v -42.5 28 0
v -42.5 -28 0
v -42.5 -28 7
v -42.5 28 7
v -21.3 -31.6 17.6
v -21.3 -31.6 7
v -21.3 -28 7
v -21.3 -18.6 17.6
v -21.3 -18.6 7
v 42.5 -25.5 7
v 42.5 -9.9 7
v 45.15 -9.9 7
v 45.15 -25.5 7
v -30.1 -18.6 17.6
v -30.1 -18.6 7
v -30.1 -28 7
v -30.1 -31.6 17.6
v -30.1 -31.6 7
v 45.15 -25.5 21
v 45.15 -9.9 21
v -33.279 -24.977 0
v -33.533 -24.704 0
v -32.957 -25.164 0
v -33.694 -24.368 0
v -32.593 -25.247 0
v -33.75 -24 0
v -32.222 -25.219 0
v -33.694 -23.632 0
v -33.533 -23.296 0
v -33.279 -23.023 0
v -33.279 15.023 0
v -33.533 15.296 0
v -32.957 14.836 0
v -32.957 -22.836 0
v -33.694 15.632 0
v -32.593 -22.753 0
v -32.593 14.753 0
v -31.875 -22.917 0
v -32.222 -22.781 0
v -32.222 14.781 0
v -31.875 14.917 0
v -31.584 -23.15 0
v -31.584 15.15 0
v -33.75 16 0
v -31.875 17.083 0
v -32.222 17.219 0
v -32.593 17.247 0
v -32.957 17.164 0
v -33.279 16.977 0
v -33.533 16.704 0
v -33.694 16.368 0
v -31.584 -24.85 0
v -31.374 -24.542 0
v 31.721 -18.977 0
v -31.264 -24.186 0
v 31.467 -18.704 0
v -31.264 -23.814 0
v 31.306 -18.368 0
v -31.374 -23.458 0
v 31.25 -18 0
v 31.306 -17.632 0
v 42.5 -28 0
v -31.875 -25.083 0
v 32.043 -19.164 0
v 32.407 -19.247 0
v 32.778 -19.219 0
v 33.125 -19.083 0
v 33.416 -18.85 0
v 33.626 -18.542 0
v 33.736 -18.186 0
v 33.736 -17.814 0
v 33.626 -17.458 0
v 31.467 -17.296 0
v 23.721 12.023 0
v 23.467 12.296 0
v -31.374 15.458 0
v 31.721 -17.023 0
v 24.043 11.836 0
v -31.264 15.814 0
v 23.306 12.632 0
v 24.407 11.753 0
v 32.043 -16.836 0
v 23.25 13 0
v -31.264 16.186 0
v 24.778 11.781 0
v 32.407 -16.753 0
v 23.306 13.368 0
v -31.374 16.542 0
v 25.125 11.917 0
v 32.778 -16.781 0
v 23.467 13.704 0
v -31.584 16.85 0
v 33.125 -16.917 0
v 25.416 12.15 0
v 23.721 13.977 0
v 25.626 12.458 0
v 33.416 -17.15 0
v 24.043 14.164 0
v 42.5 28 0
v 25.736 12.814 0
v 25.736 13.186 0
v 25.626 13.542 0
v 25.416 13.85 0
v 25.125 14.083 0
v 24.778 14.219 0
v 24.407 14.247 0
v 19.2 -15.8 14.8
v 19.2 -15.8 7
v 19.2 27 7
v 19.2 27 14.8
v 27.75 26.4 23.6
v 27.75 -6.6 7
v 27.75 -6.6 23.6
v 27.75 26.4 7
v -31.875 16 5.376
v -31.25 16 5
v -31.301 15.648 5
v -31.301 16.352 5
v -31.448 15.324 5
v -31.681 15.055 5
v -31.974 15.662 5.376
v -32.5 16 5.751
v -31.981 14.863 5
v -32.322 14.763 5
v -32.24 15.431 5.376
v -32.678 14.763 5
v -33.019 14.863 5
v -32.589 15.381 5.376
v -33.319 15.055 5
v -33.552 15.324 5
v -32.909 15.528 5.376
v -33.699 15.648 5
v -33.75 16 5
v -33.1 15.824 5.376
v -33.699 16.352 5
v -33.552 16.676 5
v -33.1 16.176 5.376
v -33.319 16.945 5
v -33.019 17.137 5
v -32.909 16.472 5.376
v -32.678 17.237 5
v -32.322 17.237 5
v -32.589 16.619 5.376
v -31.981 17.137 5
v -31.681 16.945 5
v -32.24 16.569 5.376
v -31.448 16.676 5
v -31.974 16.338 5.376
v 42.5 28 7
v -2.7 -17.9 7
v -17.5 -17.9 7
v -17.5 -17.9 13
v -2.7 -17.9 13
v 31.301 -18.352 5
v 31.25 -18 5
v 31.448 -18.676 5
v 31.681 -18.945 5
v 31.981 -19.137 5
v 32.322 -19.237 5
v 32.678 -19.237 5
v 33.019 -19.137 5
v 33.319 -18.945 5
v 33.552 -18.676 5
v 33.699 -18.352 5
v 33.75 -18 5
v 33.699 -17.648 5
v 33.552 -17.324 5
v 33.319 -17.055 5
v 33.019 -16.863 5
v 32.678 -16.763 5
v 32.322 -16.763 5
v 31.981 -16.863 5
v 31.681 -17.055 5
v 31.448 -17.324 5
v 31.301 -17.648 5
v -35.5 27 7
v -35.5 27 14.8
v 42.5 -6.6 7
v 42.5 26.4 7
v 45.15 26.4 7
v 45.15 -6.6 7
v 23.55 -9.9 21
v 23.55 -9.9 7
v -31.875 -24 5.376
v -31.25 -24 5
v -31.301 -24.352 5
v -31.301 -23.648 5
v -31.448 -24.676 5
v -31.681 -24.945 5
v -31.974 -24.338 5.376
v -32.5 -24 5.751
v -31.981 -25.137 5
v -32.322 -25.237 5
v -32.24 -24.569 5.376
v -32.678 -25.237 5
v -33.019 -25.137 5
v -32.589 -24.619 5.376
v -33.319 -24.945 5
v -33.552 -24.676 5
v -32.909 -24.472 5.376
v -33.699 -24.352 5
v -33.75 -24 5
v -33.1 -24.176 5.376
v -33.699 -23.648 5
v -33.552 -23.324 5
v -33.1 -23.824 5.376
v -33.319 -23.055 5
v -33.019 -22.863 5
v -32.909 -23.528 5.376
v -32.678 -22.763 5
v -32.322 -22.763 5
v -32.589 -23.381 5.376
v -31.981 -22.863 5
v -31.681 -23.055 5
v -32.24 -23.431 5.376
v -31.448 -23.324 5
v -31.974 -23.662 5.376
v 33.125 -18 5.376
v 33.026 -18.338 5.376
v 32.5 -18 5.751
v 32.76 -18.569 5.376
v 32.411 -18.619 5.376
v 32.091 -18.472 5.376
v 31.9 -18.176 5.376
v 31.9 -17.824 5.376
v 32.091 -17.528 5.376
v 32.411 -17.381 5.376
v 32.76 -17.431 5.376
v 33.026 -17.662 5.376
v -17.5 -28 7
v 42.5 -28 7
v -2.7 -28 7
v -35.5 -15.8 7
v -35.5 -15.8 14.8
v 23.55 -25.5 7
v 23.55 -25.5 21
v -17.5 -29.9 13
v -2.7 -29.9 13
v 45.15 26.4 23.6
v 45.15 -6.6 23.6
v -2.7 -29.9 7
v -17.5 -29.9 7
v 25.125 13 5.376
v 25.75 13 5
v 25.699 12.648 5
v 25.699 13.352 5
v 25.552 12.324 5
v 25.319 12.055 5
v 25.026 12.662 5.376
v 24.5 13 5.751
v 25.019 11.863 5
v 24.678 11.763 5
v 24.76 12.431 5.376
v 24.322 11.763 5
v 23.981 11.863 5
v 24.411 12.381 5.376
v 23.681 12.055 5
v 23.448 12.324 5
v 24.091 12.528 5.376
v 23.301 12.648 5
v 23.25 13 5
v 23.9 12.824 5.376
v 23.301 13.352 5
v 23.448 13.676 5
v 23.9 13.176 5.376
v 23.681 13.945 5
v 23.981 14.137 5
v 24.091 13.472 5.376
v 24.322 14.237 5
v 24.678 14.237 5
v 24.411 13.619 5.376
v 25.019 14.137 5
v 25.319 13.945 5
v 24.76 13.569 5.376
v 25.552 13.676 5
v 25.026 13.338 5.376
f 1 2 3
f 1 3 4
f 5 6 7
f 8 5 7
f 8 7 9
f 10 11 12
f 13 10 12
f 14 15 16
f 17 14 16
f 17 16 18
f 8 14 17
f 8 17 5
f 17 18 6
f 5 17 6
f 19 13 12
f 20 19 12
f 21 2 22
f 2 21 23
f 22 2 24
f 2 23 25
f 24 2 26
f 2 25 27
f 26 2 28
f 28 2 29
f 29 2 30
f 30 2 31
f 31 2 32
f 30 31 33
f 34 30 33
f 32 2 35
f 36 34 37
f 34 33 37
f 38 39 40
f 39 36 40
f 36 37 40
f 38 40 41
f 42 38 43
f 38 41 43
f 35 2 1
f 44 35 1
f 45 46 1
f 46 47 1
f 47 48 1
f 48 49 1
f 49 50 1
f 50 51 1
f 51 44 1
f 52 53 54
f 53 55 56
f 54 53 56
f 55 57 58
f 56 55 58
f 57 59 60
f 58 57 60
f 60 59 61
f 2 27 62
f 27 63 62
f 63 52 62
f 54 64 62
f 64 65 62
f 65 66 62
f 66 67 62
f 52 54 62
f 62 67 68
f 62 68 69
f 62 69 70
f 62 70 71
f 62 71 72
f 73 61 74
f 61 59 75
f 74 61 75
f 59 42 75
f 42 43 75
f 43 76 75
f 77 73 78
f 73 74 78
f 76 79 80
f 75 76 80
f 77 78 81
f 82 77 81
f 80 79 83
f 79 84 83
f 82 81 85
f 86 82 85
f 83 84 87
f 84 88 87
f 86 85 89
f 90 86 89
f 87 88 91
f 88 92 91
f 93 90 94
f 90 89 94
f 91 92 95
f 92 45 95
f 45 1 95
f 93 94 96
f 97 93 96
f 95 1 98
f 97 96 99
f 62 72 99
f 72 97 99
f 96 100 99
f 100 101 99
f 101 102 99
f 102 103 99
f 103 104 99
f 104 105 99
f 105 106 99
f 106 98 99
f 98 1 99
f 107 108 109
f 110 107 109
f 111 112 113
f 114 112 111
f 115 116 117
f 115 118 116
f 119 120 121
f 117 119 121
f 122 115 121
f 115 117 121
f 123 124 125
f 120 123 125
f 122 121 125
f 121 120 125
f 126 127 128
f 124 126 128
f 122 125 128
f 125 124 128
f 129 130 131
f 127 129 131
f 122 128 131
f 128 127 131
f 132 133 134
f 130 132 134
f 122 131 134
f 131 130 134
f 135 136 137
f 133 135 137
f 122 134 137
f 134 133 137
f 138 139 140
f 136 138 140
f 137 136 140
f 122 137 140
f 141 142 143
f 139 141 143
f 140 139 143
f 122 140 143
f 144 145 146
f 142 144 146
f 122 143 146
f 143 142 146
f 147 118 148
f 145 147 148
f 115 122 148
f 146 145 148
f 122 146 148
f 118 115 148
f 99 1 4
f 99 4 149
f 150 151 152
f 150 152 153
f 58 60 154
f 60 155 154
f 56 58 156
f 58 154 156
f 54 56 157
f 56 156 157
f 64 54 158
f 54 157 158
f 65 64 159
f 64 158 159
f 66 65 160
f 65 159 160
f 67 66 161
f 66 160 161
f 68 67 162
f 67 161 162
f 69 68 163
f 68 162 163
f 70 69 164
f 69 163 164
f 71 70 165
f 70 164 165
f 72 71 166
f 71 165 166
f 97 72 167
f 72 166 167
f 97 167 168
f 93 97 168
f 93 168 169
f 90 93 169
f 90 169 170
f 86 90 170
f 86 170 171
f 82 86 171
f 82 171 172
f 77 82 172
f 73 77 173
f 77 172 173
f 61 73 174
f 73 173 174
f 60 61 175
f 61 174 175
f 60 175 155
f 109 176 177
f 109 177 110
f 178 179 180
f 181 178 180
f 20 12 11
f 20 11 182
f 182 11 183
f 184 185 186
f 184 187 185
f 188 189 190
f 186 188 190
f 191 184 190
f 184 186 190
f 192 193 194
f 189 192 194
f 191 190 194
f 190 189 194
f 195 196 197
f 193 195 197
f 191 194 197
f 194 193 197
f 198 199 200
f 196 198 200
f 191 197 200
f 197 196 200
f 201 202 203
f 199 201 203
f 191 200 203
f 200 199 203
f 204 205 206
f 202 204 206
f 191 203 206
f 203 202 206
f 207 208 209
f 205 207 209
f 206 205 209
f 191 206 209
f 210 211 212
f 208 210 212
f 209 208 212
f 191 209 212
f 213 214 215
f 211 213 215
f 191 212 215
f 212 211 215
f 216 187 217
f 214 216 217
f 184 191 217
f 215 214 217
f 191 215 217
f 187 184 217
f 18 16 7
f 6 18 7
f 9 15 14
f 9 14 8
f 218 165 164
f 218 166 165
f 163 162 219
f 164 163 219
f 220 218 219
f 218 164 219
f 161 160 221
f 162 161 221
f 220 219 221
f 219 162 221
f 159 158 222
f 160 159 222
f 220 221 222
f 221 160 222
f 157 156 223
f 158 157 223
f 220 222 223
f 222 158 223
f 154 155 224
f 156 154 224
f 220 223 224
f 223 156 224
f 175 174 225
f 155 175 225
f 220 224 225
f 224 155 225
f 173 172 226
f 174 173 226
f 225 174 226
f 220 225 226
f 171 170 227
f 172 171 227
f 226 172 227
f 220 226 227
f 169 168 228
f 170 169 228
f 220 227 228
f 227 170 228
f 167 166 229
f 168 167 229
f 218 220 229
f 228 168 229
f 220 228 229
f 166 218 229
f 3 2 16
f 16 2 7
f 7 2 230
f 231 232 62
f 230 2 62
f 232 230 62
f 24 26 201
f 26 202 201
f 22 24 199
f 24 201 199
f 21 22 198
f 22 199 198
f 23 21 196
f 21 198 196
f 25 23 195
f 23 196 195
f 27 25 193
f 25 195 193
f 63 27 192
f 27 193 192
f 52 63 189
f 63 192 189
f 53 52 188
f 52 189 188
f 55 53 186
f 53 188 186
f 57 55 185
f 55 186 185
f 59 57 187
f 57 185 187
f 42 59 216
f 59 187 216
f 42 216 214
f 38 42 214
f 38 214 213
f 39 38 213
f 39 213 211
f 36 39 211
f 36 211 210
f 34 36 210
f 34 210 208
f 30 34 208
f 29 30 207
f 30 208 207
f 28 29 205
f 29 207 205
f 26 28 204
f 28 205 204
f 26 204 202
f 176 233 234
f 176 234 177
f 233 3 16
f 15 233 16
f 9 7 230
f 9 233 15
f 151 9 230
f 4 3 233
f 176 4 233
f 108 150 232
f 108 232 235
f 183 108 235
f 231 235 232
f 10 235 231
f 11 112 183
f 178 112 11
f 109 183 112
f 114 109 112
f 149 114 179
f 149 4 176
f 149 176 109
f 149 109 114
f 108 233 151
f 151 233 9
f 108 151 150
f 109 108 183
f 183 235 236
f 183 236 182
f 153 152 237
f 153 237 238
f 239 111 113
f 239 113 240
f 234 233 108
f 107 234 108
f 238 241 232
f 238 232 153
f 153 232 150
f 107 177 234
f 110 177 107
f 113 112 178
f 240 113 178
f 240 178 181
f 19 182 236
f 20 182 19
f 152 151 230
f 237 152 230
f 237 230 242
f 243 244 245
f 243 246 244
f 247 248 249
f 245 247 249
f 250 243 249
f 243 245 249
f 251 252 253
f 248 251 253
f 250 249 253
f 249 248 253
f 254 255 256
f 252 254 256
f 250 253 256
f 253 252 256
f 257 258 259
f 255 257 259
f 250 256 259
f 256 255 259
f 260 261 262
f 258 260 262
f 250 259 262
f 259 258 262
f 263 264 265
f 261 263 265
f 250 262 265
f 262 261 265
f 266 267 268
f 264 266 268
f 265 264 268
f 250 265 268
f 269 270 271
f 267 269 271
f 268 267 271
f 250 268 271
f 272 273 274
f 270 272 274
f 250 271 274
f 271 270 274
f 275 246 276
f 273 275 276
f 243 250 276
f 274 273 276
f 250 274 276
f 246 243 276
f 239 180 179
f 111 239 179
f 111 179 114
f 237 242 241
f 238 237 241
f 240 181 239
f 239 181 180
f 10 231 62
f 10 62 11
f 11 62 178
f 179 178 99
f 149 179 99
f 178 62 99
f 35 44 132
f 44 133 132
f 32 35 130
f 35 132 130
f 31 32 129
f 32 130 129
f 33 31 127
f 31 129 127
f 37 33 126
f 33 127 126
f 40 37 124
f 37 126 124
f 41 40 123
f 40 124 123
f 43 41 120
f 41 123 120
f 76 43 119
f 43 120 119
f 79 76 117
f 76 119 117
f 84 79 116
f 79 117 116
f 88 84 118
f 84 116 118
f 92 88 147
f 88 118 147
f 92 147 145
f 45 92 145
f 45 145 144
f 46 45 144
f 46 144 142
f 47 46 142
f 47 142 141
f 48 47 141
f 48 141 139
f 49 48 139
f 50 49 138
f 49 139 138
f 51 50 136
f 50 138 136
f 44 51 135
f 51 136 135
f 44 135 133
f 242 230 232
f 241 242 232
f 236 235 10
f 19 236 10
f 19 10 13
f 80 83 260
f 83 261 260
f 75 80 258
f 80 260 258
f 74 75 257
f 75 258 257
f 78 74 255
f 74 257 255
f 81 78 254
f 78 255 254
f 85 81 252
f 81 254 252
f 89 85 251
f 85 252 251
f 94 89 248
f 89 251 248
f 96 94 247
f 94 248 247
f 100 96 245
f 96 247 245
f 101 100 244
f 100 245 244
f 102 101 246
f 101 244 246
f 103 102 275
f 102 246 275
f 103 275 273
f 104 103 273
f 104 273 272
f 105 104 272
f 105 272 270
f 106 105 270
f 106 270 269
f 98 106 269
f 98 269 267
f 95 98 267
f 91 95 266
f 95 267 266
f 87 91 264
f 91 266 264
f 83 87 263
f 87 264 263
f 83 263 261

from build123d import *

# Parameters (mm, degrees)
F0_W     = 85
F0_H     = 56
F1_DEPTH = 7
F2_W     = 14.75
F2_H     = 33
F2_W_2   = 2.65
F3_DEPTH = 16.6
F2_W_3   = 18.95
F2_H_2   = 15.6
F4_DEPTH = 14
F2_W_4   = 14.8
F2_H_3   = 10.1
F2_H_4   = 1.9
F5_DEPTH = 6
F2_W_5   = 8.8
F2_H_5   = 9.4
F2_H_6   = 3.6
F6_DEPTH = 10.6
F2_W_6   = 54.7
F2_H_7   = 42.8
F7_DEPTH = 7.8
F8_D     = 2.5
F8_DEPTH = 5
F8_TIP   = 0.7510757738


with BuildPart() as f1:
    # F0 (on Top) → F1 (new body)
    with BuildSketch(Plane.XY):
        Rectangle(F0_W, F0_H)
    extrude(amount=F1_DEPTH)

    # F2 (on face) → F3 (join)
    with BuildSketch(Plane.XY.offset(7)):
        with Locations((35.125, 9.9)):
            Rectangle(F2_W, F2_H)
        with Locations((43.825, 9.9)):
            Rectangle(F2_W_2, F2_H)
    extrude(amount=F3_DEPTH)

    # F2 (on face) → F4 (join)
    with BuildSketch(Plane.XY.offset(7)):
        with Locations((33.025, -17.7)):
            Rectangle(F2_W_3, F2_H_2)
        with Locations((43.825, -17.7)):
            Rectangle(F2_W_2, F2_H_2)
    extrude(amount=F4_DEPTH)

    # F2 (on face) → F5 (join)
    with BuildSketch(Plane.XY.offset(7)):
        with Locations((-10.1, -22.95)):
            Rectangle(F2_W_4, F2_H_3)
        with Locations((-10.1, -28.95)):
            Rectangle(F2_W_4, F2_H_4)
    extrude(amount=F5_DEPTH)

    # F2 (on face) → F6 (join)
    with BuildSketch(Plane.XY.offset(7)):
        with Locations((-25.7, -23.3)):
            Rectangle(F2_W_5, F2_H_5)
        with Locations((-25.7, -29.8)):
            Rectangle(F2_W_5, F2_H_6)
    extrude(amount=F6_DEPTH)

    # F2 (on face) → F7 (join)
    with BuildSketch(Plane.XY.offset(7)):
        with Locations((-8.15, 5.6)):
            Rectangle(F2_W_6, F2_H_7)
    extrude(amount=F7_DEPTH)

    # F8
    with Locations(Plane(origin=(0, 0, 0), x_dir=(1, 0, 0), z_dir=(0, 0, -1))):
        with Locations((-32.5, 24), (32.5, 18), (24.5, -13), (-32.5, -16)):
            Hole(F8_D / 2, depth=F8_DEPTH)
            with Locations((0, 0, -(F8_DEPTH + F8_TIP / 2))):  # 118° drill point
                Cone(0, F8_D / 2, F8_TIP, mode=Mode.SUBTRACT)


solid = f1.part
